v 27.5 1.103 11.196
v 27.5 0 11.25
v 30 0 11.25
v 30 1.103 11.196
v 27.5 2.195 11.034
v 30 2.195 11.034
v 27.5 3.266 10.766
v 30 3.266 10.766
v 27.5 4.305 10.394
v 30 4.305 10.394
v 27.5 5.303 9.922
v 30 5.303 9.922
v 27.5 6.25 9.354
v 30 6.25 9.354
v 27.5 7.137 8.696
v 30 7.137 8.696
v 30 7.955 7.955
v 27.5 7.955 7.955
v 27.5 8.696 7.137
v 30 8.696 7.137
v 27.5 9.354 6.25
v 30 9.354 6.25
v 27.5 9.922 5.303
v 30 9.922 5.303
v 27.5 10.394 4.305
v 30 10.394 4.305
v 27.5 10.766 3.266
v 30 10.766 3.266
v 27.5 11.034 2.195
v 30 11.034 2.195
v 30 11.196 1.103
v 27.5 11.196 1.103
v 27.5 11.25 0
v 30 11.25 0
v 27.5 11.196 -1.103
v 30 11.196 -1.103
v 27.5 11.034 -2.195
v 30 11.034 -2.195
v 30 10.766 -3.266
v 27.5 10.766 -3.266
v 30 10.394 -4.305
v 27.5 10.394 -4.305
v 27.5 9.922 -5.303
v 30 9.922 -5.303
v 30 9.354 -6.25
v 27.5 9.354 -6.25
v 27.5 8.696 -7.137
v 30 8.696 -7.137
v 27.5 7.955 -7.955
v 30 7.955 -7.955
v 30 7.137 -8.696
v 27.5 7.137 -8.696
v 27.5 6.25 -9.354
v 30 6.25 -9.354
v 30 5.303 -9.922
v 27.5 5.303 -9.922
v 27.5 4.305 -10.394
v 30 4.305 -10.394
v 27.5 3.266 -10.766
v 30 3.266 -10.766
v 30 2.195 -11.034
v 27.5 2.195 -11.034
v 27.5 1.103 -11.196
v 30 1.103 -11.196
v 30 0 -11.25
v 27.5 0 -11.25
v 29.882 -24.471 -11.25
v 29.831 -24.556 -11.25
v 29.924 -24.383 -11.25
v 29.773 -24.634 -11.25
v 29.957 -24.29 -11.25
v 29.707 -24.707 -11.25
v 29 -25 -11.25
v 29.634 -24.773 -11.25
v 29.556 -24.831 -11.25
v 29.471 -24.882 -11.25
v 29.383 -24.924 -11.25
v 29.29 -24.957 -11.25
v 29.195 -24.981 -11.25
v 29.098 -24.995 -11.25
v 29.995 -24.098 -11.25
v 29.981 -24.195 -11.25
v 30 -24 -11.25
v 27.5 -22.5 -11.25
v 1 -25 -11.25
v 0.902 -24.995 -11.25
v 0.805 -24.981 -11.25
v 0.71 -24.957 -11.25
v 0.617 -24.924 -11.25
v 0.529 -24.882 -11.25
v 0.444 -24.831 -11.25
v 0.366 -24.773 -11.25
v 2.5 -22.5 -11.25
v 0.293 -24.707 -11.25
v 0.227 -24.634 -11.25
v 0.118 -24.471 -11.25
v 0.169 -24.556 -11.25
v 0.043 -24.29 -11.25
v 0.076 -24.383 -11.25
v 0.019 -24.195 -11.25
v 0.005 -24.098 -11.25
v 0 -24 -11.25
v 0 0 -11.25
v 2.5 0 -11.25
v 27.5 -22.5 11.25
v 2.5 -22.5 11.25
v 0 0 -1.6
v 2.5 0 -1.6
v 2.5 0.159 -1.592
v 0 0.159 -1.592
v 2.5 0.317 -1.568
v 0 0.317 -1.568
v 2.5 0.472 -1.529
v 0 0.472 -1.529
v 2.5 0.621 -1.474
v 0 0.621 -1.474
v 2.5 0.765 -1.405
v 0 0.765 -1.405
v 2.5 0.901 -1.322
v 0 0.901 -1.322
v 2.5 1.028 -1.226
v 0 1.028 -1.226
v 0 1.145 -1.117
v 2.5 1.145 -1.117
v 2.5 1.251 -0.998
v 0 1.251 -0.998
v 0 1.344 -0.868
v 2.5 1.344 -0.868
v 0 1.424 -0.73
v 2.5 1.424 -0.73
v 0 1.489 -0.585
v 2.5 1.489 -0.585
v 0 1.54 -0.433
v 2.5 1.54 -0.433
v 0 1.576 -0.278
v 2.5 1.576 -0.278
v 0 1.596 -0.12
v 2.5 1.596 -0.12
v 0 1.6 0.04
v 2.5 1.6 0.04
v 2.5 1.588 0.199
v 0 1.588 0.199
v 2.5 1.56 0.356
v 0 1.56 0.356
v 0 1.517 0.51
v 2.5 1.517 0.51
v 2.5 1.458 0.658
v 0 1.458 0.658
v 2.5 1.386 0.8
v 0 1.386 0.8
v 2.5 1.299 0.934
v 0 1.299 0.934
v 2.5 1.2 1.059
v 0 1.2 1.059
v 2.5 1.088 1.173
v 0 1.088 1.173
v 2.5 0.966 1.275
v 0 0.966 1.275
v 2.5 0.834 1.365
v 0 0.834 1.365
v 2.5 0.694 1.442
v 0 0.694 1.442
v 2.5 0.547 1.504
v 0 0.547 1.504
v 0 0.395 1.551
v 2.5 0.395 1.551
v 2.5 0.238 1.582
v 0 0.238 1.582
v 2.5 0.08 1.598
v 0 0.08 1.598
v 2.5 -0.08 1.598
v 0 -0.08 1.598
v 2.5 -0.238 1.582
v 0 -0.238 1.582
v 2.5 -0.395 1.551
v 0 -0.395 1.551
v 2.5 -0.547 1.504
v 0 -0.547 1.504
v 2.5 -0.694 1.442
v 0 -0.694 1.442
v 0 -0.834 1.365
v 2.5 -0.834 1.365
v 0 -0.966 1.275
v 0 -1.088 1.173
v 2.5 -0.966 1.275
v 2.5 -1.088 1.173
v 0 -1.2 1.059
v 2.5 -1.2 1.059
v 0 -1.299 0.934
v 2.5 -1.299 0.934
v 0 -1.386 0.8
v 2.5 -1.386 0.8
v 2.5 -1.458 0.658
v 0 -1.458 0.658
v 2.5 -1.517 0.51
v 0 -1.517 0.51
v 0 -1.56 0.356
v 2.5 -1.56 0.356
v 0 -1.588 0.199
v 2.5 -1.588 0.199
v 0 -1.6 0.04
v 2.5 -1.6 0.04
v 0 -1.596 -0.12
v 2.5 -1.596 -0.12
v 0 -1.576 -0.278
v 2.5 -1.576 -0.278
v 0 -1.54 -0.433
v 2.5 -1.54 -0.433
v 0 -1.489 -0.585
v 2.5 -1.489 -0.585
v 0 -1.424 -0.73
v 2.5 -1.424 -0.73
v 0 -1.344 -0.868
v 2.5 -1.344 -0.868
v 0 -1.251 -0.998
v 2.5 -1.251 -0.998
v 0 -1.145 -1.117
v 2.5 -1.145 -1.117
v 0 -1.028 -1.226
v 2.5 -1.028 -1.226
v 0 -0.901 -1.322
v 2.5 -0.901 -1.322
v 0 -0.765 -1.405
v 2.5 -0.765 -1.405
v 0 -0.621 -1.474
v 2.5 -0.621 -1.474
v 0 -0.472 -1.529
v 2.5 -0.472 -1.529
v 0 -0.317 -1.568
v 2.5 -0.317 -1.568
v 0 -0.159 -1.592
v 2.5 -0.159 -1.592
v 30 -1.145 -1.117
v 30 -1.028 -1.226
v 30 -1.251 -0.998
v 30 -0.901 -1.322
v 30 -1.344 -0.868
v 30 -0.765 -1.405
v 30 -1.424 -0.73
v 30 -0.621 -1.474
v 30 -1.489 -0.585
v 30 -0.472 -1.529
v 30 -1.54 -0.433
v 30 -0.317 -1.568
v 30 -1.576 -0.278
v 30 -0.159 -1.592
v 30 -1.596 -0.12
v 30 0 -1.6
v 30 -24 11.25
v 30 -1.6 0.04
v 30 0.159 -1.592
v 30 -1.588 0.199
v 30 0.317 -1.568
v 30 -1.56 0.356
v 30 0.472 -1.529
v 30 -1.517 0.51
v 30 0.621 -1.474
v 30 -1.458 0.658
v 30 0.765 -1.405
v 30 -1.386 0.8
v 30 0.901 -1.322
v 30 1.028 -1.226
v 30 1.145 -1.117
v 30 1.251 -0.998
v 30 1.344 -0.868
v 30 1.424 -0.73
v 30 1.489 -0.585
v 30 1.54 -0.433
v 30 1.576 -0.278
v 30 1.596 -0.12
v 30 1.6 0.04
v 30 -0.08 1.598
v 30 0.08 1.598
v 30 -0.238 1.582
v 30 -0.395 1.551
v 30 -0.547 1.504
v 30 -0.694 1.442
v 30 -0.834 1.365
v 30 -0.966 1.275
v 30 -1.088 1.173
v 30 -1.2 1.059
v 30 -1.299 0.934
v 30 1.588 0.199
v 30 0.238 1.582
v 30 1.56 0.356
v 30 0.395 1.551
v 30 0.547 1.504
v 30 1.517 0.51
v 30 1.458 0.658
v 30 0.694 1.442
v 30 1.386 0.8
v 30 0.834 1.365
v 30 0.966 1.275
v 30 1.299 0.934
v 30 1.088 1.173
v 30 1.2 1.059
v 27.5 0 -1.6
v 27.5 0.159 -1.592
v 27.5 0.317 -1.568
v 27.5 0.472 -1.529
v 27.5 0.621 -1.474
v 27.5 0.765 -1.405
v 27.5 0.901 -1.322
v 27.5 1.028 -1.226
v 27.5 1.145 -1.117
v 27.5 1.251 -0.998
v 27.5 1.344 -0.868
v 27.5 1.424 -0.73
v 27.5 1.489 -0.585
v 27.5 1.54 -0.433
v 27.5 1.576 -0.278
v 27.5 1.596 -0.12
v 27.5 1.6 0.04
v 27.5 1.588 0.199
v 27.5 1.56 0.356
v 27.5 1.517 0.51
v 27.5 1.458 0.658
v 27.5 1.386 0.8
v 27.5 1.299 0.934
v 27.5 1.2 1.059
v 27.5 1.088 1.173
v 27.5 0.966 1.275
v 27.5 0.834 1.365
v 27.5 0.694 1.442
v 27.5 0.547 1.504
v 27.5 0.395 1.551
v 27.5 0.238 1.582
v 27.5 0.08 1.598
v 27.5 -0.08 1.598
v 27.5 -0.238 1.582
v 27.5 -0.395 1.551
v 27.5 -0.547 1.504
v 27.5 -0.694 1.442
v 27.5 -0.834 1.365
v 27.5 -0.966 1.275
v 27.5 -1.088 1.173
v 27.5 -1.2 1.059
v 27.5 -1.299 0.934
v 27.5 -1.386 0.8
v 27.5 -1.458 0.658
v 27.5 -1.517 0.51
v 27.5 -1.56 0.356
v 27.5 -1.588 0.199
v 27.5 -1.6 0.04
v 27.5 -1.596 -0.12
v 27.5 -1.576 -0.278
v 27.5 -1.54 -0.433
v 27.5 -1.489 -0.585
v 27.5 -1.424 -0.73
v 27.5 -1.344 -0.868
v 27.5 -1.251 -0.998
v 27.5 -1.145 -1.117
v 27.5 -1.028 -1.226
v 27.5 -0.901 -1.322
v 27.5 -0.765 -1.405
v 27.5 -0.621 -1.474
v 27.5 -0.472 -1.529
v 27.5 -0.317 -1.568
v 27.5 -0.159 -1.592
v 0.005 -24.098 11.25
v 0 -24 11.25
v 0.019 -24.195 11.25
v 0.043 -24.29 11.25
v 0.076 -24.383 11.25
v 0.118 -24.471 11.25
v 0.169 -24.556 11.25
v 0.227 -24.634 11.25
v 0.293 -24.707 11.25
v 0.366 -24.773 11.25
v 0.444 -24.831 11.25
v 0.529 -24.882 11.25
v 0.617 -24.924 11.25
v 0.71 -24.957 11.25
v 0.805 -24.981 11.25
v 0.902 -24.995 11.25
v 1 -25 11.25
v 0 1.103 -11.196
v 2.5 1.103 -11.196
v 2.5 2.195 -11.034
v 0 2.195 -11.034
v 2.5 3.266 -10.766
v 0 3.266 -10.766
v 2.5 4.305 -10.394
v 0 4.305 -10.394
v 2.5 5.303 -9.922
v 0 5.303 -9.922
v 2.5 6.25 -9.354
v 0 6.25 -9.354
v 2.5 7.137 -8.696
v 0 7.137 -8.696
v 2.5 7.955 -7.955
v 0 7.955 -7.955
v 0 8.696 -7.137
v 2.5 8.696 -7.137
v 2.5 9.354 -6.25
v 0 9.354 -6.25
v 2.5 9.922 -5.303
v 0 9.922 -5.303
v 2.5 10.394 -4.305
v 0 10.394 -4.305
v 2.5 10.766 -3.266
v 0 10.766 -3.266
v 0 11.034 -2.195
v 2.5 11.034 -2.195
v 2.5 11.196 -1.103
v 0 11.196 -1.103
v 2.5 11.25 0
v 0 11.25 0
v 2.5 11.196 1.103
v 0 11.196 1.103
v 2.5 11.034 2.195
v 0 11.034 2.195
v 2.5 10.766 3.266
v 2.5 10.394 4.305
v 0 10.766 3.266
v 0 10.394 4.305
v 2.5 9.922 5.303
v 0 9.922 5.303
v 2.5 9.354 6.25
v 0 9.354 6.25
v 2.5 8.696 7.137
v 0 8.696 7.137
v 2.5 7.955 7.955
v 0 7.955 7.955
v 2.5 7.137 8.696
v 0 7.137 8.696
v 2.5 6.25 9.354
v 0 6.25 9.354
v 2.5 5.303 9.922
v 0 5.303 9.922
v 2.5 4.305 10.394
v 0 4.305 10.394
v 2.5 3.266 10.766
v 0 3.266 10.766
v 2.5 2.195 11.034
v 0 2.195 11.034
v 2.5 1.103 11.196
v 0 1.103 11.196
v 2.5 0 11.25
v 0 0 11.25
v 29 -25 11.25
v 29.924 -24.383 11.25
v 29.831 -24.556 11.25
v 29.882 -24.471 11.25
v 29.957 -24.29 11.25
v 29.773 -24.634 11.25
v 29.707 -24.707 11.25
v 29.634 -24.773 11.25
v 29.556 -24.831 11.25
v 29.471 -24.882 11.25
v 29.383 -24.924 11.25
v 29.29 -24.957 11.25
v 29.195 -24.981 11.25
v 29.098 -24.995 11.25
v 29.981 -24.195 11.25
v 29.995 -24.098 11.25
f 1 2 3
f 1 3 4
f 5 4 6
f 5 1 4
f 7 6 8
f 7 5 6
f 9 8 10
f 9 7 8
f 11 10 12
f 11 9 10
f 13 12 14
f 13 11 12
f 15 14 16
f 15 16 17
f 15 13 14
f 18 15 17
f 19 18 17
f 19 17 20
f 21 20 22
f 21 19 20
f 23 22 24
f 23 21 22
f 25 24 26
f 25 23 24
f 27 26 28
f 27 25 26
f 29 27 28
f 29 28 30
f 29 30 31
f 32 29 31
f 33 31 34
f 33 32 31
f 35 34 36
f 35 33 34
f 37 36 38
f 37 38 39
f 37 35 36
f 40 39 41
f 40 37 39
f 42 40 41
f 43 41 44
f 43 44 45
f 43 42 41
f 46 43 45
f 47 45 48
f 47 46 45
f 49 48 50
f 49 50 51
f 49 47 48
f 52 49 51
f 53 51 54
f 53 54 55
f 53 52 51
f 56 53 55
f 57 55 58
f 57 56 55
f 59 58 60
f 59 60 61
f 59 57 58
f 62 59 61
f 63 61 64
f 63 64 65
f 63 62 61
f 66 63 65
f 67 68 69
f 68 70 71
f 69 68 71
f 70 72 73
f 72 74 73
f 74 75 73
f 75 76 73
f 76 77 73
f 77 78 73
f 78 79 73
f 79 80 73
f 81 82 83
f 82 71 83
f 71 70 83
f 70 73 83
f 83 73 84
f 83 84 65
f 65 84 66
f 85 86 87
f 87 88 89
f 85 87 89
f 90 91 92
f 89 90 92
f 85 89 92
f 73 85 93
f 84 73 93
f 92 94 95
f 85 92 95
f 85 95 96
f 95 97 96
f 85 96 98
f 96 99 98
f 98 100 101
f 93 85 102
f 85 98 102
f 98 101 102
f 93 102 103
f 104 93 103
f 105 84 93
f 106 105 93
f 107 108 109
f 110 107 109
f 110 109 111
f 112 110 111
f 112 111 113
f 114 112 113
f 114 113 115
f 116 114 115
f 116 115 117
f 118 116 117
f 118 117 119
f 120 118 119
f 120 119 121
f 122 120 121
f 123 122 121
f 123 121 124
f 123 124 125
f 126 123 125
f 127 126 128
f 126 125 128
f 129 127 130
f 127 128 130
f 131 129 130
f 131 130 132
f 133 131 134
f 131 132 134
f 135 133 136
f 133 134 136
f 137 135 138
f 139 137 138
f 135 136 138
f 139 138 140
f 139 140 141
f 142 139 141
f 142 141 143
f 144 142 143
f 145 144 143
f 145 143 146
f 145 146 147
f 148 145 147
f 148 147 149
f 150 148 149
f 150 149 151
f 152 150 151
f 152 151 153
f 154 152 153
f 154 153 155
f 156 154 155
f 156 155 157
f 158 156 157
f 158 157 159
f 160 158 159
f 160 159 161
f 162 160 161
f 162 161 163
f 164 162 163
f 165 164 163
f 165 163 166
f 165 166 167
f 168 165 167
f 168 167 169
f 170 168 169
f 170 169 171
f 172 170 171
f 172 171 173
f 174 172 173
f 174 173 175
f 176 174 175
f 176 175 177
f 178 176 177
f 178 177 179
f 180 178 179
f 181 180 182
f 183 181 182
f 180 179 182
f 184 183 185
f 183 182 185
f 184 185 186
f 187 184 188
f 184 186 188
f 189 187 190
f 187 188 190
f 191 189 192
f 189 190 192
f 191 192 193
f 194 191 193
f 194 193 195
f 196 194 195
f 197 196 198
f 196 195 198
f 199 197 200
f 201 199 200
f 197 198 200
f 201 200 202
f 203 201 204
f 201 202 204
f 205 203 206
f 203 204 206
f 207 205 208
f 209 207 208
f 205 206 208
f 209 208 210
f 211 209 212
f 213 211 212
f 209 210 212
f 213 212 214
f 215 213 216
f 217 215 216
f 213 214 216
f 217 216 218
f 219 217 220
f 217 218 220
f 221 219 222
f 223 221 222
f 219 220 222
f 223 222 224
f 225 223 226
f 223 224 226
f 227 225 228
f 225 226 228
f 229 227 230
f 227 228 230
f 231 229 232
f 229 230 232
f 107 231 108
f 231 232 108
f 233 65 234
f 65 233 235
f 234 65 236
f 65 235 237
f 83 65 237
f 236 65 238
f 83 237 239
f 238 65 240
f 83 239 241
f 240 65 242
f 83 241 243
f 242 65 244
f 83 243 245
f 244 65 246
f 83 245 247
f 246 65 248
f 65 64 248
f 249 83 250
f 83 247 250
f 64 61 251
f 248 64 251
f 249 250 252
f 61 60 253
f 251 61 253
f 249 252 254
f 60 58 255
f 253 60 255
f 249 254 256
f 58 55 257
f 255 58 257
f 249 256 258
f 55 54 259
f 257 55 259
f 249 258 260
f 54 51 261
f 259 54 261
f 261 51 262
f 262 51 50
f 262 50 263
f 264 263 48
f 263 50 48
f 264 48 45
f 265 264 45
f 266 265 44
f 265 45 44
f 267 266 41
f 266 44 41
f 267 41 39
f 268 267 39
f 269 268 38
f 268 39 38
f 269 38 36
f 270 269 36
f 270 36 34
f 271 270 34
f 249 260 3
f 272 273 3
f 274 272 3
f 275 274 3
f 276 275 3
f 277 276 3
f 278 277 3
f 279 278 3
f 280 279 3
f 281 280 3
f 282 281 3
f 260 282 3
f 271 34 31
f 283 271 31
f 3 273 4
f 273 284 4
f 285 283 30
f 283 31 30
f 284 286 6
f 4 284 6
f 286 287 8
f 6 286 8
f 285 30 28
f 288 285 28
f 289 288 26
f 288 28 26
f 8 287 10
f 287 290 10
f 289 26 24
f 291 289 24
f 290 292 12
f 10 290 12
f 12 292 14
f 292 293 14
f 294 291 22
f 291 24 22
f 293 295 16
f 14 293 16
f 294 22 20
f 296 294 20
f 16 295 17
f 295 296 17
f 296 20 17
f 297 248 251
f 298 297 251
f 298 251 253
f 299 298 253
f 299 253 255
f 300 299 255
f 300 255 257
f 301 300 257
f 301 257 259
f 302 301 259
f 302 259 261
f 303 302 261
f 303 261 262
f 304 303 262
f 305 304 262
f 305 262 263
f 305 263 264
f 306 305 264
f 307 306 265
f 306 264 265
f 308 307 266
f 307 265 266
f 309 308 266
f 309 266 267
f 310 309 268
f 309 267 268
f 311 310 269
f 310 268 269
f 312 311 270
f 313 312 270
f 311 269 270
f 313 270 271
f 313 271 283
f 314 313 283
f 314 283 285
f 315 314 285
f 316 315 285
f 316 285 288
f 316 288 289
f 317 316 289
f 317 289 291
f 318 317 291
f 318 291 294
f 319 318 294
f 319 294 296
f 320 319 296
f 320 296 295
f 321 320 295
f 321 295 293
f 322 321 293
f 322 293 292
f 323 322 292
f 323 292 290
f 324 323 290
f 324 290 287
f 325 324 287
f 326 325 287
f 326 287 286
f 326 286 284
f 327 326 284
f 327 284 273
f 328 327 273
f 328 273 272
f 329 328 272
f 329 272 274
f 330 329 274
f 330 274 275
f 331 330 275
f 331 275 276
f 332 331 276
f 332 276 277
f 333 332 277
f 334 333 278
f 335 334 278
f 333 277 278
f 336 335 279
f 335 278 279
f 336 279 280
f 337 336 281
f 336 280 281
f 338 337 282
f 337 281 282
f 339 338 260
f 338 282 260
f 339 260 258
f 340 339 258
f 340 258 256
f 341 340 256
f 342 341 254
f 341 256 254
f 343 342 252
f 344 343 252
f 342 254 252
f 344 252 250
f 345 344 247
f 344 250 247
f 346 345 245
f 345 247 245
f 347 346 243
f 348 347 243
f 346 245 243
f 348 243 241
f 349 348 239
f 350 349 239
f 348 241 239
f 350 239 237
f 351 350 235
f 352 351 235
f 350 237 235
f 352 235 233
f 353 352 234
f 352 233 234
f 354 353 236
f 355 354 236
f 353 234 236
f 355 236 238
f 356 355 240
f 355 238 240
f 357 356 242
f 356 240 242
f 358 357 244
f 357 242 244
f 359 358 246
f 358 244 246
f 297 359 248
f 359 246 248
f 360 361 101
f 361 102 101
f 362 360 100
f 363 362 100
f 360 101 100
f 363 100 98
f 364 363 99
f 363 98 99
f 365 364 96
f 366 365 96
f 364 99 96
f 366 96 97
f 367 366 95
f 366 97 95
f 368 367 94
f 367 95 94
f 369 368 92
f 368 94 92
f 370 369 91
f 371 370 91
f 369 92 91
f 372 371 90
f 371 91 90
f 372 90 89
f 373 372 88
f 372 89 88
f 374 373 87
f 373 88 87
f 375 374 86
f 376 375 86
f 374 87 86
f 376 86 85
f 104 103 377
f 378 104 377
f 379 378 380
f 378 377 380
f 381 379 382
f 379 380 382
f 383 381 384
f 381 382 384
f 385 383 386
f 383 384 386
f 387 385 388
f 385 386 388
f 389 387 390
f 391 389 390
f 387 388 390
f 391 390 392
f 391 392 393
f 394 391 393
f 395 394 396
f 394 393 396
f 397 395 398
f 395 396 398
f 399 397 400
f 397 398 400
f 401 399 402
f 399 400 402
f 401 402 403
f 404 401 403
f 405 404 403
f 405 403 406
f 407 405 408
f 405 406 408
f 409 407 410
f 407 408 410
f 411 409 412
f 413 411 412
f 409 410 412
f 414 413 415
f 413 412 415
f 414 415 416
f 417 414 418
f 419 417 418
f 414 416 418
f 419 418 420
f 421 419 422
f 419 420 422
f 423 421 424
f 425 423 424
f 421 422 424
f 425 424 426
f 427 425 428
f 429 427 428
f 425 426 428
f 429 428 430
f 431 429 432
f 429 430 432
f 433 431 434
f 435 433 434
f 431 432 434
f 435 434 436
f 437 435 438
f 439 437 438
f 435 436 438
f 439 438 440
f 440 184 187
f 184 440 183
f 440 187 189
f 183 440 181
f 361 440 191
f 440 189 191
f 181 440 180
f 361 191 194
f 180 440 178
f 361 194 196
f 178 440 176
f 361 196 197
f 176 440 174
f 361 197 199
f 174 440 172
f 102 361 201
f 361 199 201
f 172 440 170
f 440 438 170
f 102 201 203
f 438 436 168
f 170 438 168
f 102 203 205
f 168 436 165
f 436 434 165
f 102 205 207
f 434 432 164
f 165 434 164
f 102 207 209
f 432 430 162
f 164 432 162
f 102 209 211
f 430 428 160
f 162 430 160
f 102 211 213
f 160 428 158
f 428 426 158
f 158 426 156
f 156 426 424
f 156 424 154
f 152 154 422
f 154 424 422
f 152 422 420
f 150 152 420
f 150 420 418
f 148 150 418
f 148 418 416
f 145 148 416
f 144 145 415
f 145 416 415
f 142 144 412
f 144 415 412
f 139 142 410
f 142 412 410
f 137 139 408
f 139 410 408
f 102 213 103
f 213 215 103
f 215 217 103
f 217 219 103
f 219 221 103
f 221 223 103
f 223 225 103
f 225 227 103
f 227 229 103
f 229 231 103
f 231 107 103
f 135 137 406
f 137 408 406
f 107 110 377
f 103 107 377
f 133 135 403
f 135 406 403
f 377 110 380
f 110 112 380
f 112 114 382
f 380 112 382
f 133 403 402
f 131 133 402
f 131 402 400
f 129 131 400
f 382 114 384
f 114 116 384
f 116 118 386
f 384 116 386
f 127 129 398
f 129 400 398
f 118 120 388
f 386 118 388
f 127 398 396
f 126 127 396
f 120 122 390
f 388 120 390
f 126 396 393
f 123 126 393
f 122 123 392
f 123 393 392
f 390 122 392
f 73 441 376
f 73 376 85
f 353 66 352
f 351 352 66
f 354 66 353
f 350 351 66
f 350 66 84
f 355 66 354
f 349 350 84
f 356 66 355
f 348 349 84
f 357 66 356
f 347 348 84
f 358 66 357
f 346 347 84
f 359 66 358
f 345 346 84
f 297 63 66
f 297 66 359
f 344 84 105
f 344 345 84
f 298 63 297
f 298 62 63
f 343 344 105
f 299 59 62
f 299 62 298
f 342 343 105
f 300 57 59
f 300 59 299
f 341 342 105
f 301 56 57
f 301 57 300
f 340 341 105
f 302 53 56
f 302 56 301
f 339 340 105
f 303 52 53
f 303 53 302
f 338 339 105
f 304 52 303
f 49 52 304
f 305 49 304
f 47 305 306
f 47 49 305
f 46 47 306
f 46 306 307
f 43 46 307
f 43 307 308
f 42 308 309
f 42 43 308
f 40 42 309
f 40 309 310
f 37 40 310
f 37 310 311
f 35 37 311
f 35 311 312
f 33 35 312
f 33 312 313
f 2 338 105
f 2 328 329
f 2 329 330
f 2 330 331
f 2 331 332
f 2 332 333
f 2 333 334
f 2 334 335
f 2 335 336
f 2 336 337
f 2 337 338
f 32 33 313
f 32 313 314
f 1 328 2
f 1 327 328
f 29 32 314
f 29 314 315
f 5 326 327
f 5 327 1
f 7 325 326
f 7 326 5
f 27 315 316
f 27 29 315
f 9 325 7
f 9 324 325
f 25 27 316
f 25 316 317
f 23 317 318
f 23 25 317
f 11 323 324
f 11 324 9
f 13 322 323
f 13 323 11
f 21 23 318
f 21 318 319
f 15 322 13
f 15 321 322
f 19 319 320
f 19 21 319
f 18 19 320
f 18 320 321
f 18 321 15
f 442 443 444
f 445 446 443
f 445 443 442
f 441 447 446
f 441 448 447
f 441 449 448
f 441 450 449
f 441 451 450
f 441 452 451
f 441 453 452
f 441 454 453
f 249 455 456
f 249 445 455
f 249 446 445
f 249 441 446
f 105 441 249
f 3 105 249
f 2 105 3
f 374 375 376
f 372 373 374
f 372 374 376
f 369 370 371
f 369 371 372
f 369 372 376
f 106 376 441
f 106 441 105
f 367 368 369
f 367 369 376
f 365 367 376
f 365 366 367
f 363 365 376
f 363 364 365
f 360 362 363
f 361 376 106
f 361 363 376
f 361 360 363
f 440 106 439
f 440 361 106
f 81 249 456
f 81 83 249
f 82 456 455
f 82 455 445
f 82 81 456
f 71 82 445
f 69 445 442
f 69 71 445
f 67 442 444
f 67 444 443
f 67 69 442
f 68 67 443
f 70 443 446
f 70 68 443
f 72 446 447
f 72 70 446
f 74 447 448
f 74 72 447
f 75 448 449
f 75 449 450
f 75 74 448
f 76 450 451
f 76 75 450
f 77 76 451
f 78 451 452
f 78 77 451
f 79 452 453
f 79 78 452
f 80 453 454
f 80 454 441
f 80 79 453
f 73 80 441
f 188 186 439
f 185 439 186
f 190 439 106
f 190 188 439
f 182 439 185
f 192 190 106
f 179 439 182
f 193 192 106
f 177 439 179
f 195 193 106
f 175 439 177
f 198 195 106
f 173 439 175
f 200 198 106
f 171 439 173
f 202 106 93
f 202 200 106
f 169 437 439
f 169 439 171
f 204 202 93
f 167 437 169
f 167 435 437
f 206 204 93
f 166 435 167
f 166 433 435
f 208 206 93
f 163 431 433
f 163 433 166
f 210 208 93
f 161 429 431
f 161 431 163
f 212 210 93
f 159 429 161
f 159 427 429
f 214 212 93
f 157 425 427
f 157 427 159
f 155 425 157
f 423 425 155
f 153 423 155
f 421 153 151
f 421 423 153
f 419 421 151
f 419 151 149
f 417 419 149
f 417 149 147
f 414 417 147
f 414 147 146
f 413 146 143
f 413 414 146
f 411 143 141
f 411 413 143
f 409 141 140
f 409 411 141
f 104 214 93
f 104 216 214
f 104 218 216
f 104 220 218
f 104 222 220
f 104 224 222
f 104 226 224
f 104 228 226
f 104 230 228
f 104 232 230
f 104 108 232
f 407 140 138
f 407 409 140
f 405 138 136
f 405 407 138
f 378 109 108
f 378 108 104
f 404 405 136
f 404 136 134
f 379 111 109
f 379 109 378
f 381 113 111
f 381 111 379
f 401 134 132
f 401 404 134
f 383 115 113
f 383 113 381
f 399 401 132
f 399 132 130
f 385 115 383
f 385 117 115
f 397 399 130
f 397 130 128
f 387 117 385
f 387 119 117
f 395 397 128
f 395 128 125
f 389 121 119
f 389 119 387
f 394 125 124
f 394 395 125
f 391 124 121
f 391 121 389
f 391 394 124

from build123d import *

# Parameters (mm, degrees)
BOSS_EXTRUDE1_DEPTH = 2.5
SKETCH2_W           = 27.5
SKETCH2_H           = 22.5
BOSS_EXTRUDE2_DEPTH = 2.5
SKETCH5_W           = 22.5
SKETCH5_H           = 25
BOSS_EXTRUDE3_DEPTH = 2.5
SKETCH6_R           = 1.6
CUT_EXTRUDE1_DEPTH  = 30
FILLET1_R           = 1


with BuildPart() as part:
    # Sketch1 → Boss-Extrude1 (new body)
    with BuildSketch(Plane(origin=(0, 0, 0), x_dir=(0, 0, -1), z_dir=(1, 0, 0))):
        with BuildLine():
            Line((-11.25, 0), (-11.25, -22.5))
            Line((-11.25, -22.5), (11.25, -22.5))
            Line((11.25, -22.5), (11.25, 0))
            ThreePointArc((11.25, 0), (0, 11.25), (-11.25, 0))
        make_face()
    extrude(amount=BOSS_EXTRUDE1_DEPTH)

    # Sketch2 → Boss-Extrude2 (add)
    with BuildSketch(Plane(origin=(0, -22.5, 0), x_dir=(-1, 0, 0), z_dir=(0, -1, 0))):
        with Locations((-13.75, 0)):
            Rectangle(SKETCH2_W, SKETCH2_H)
    extrude(amount=BOSS_EXTRUDE2_DEPTH)

    # Sketch5 → Boss-Extrude3 (add)
    with BuildSketch(Plane(origin=(27.5, 0, 0), x_dir=(0, 0, -1), z_dir=(1, 0, 0))):
        with BuildLine():
            ThreePointArc((-11.25, 0), (0, 11.25), (11.25, 0))
            Line((11.25, 0), (-11.25, 0))
        make_face()
        with Locations((0, -12.5)):
            Rectangle(SKETCH5_W, SKETCH5_H)
    extrude(amount=BOSS_EXTRUDE3_DEPTH)

    # Sketch6 → Cut-Extrude1 (cut)
    with BuildSketch(Plane(origin=(30, 0, 0), x_dir=(0, 0, -1), z_dir=(1, 0, 0))):
        Circle(SKETCH6_R)
    extrude(amount=-CUT_EXTRUDE1_DEPTH, mode=Mode.SUBTRACT)

    # Fillet1
    fillet1_edges = [part.edges().sort_by_distance(p)[0] for p in [
        (0, -25, 0),
        (30, -25, 0),
    ]]
    fillet(fillet1_edges, radius=FILLET1_R)


solid = part.part
